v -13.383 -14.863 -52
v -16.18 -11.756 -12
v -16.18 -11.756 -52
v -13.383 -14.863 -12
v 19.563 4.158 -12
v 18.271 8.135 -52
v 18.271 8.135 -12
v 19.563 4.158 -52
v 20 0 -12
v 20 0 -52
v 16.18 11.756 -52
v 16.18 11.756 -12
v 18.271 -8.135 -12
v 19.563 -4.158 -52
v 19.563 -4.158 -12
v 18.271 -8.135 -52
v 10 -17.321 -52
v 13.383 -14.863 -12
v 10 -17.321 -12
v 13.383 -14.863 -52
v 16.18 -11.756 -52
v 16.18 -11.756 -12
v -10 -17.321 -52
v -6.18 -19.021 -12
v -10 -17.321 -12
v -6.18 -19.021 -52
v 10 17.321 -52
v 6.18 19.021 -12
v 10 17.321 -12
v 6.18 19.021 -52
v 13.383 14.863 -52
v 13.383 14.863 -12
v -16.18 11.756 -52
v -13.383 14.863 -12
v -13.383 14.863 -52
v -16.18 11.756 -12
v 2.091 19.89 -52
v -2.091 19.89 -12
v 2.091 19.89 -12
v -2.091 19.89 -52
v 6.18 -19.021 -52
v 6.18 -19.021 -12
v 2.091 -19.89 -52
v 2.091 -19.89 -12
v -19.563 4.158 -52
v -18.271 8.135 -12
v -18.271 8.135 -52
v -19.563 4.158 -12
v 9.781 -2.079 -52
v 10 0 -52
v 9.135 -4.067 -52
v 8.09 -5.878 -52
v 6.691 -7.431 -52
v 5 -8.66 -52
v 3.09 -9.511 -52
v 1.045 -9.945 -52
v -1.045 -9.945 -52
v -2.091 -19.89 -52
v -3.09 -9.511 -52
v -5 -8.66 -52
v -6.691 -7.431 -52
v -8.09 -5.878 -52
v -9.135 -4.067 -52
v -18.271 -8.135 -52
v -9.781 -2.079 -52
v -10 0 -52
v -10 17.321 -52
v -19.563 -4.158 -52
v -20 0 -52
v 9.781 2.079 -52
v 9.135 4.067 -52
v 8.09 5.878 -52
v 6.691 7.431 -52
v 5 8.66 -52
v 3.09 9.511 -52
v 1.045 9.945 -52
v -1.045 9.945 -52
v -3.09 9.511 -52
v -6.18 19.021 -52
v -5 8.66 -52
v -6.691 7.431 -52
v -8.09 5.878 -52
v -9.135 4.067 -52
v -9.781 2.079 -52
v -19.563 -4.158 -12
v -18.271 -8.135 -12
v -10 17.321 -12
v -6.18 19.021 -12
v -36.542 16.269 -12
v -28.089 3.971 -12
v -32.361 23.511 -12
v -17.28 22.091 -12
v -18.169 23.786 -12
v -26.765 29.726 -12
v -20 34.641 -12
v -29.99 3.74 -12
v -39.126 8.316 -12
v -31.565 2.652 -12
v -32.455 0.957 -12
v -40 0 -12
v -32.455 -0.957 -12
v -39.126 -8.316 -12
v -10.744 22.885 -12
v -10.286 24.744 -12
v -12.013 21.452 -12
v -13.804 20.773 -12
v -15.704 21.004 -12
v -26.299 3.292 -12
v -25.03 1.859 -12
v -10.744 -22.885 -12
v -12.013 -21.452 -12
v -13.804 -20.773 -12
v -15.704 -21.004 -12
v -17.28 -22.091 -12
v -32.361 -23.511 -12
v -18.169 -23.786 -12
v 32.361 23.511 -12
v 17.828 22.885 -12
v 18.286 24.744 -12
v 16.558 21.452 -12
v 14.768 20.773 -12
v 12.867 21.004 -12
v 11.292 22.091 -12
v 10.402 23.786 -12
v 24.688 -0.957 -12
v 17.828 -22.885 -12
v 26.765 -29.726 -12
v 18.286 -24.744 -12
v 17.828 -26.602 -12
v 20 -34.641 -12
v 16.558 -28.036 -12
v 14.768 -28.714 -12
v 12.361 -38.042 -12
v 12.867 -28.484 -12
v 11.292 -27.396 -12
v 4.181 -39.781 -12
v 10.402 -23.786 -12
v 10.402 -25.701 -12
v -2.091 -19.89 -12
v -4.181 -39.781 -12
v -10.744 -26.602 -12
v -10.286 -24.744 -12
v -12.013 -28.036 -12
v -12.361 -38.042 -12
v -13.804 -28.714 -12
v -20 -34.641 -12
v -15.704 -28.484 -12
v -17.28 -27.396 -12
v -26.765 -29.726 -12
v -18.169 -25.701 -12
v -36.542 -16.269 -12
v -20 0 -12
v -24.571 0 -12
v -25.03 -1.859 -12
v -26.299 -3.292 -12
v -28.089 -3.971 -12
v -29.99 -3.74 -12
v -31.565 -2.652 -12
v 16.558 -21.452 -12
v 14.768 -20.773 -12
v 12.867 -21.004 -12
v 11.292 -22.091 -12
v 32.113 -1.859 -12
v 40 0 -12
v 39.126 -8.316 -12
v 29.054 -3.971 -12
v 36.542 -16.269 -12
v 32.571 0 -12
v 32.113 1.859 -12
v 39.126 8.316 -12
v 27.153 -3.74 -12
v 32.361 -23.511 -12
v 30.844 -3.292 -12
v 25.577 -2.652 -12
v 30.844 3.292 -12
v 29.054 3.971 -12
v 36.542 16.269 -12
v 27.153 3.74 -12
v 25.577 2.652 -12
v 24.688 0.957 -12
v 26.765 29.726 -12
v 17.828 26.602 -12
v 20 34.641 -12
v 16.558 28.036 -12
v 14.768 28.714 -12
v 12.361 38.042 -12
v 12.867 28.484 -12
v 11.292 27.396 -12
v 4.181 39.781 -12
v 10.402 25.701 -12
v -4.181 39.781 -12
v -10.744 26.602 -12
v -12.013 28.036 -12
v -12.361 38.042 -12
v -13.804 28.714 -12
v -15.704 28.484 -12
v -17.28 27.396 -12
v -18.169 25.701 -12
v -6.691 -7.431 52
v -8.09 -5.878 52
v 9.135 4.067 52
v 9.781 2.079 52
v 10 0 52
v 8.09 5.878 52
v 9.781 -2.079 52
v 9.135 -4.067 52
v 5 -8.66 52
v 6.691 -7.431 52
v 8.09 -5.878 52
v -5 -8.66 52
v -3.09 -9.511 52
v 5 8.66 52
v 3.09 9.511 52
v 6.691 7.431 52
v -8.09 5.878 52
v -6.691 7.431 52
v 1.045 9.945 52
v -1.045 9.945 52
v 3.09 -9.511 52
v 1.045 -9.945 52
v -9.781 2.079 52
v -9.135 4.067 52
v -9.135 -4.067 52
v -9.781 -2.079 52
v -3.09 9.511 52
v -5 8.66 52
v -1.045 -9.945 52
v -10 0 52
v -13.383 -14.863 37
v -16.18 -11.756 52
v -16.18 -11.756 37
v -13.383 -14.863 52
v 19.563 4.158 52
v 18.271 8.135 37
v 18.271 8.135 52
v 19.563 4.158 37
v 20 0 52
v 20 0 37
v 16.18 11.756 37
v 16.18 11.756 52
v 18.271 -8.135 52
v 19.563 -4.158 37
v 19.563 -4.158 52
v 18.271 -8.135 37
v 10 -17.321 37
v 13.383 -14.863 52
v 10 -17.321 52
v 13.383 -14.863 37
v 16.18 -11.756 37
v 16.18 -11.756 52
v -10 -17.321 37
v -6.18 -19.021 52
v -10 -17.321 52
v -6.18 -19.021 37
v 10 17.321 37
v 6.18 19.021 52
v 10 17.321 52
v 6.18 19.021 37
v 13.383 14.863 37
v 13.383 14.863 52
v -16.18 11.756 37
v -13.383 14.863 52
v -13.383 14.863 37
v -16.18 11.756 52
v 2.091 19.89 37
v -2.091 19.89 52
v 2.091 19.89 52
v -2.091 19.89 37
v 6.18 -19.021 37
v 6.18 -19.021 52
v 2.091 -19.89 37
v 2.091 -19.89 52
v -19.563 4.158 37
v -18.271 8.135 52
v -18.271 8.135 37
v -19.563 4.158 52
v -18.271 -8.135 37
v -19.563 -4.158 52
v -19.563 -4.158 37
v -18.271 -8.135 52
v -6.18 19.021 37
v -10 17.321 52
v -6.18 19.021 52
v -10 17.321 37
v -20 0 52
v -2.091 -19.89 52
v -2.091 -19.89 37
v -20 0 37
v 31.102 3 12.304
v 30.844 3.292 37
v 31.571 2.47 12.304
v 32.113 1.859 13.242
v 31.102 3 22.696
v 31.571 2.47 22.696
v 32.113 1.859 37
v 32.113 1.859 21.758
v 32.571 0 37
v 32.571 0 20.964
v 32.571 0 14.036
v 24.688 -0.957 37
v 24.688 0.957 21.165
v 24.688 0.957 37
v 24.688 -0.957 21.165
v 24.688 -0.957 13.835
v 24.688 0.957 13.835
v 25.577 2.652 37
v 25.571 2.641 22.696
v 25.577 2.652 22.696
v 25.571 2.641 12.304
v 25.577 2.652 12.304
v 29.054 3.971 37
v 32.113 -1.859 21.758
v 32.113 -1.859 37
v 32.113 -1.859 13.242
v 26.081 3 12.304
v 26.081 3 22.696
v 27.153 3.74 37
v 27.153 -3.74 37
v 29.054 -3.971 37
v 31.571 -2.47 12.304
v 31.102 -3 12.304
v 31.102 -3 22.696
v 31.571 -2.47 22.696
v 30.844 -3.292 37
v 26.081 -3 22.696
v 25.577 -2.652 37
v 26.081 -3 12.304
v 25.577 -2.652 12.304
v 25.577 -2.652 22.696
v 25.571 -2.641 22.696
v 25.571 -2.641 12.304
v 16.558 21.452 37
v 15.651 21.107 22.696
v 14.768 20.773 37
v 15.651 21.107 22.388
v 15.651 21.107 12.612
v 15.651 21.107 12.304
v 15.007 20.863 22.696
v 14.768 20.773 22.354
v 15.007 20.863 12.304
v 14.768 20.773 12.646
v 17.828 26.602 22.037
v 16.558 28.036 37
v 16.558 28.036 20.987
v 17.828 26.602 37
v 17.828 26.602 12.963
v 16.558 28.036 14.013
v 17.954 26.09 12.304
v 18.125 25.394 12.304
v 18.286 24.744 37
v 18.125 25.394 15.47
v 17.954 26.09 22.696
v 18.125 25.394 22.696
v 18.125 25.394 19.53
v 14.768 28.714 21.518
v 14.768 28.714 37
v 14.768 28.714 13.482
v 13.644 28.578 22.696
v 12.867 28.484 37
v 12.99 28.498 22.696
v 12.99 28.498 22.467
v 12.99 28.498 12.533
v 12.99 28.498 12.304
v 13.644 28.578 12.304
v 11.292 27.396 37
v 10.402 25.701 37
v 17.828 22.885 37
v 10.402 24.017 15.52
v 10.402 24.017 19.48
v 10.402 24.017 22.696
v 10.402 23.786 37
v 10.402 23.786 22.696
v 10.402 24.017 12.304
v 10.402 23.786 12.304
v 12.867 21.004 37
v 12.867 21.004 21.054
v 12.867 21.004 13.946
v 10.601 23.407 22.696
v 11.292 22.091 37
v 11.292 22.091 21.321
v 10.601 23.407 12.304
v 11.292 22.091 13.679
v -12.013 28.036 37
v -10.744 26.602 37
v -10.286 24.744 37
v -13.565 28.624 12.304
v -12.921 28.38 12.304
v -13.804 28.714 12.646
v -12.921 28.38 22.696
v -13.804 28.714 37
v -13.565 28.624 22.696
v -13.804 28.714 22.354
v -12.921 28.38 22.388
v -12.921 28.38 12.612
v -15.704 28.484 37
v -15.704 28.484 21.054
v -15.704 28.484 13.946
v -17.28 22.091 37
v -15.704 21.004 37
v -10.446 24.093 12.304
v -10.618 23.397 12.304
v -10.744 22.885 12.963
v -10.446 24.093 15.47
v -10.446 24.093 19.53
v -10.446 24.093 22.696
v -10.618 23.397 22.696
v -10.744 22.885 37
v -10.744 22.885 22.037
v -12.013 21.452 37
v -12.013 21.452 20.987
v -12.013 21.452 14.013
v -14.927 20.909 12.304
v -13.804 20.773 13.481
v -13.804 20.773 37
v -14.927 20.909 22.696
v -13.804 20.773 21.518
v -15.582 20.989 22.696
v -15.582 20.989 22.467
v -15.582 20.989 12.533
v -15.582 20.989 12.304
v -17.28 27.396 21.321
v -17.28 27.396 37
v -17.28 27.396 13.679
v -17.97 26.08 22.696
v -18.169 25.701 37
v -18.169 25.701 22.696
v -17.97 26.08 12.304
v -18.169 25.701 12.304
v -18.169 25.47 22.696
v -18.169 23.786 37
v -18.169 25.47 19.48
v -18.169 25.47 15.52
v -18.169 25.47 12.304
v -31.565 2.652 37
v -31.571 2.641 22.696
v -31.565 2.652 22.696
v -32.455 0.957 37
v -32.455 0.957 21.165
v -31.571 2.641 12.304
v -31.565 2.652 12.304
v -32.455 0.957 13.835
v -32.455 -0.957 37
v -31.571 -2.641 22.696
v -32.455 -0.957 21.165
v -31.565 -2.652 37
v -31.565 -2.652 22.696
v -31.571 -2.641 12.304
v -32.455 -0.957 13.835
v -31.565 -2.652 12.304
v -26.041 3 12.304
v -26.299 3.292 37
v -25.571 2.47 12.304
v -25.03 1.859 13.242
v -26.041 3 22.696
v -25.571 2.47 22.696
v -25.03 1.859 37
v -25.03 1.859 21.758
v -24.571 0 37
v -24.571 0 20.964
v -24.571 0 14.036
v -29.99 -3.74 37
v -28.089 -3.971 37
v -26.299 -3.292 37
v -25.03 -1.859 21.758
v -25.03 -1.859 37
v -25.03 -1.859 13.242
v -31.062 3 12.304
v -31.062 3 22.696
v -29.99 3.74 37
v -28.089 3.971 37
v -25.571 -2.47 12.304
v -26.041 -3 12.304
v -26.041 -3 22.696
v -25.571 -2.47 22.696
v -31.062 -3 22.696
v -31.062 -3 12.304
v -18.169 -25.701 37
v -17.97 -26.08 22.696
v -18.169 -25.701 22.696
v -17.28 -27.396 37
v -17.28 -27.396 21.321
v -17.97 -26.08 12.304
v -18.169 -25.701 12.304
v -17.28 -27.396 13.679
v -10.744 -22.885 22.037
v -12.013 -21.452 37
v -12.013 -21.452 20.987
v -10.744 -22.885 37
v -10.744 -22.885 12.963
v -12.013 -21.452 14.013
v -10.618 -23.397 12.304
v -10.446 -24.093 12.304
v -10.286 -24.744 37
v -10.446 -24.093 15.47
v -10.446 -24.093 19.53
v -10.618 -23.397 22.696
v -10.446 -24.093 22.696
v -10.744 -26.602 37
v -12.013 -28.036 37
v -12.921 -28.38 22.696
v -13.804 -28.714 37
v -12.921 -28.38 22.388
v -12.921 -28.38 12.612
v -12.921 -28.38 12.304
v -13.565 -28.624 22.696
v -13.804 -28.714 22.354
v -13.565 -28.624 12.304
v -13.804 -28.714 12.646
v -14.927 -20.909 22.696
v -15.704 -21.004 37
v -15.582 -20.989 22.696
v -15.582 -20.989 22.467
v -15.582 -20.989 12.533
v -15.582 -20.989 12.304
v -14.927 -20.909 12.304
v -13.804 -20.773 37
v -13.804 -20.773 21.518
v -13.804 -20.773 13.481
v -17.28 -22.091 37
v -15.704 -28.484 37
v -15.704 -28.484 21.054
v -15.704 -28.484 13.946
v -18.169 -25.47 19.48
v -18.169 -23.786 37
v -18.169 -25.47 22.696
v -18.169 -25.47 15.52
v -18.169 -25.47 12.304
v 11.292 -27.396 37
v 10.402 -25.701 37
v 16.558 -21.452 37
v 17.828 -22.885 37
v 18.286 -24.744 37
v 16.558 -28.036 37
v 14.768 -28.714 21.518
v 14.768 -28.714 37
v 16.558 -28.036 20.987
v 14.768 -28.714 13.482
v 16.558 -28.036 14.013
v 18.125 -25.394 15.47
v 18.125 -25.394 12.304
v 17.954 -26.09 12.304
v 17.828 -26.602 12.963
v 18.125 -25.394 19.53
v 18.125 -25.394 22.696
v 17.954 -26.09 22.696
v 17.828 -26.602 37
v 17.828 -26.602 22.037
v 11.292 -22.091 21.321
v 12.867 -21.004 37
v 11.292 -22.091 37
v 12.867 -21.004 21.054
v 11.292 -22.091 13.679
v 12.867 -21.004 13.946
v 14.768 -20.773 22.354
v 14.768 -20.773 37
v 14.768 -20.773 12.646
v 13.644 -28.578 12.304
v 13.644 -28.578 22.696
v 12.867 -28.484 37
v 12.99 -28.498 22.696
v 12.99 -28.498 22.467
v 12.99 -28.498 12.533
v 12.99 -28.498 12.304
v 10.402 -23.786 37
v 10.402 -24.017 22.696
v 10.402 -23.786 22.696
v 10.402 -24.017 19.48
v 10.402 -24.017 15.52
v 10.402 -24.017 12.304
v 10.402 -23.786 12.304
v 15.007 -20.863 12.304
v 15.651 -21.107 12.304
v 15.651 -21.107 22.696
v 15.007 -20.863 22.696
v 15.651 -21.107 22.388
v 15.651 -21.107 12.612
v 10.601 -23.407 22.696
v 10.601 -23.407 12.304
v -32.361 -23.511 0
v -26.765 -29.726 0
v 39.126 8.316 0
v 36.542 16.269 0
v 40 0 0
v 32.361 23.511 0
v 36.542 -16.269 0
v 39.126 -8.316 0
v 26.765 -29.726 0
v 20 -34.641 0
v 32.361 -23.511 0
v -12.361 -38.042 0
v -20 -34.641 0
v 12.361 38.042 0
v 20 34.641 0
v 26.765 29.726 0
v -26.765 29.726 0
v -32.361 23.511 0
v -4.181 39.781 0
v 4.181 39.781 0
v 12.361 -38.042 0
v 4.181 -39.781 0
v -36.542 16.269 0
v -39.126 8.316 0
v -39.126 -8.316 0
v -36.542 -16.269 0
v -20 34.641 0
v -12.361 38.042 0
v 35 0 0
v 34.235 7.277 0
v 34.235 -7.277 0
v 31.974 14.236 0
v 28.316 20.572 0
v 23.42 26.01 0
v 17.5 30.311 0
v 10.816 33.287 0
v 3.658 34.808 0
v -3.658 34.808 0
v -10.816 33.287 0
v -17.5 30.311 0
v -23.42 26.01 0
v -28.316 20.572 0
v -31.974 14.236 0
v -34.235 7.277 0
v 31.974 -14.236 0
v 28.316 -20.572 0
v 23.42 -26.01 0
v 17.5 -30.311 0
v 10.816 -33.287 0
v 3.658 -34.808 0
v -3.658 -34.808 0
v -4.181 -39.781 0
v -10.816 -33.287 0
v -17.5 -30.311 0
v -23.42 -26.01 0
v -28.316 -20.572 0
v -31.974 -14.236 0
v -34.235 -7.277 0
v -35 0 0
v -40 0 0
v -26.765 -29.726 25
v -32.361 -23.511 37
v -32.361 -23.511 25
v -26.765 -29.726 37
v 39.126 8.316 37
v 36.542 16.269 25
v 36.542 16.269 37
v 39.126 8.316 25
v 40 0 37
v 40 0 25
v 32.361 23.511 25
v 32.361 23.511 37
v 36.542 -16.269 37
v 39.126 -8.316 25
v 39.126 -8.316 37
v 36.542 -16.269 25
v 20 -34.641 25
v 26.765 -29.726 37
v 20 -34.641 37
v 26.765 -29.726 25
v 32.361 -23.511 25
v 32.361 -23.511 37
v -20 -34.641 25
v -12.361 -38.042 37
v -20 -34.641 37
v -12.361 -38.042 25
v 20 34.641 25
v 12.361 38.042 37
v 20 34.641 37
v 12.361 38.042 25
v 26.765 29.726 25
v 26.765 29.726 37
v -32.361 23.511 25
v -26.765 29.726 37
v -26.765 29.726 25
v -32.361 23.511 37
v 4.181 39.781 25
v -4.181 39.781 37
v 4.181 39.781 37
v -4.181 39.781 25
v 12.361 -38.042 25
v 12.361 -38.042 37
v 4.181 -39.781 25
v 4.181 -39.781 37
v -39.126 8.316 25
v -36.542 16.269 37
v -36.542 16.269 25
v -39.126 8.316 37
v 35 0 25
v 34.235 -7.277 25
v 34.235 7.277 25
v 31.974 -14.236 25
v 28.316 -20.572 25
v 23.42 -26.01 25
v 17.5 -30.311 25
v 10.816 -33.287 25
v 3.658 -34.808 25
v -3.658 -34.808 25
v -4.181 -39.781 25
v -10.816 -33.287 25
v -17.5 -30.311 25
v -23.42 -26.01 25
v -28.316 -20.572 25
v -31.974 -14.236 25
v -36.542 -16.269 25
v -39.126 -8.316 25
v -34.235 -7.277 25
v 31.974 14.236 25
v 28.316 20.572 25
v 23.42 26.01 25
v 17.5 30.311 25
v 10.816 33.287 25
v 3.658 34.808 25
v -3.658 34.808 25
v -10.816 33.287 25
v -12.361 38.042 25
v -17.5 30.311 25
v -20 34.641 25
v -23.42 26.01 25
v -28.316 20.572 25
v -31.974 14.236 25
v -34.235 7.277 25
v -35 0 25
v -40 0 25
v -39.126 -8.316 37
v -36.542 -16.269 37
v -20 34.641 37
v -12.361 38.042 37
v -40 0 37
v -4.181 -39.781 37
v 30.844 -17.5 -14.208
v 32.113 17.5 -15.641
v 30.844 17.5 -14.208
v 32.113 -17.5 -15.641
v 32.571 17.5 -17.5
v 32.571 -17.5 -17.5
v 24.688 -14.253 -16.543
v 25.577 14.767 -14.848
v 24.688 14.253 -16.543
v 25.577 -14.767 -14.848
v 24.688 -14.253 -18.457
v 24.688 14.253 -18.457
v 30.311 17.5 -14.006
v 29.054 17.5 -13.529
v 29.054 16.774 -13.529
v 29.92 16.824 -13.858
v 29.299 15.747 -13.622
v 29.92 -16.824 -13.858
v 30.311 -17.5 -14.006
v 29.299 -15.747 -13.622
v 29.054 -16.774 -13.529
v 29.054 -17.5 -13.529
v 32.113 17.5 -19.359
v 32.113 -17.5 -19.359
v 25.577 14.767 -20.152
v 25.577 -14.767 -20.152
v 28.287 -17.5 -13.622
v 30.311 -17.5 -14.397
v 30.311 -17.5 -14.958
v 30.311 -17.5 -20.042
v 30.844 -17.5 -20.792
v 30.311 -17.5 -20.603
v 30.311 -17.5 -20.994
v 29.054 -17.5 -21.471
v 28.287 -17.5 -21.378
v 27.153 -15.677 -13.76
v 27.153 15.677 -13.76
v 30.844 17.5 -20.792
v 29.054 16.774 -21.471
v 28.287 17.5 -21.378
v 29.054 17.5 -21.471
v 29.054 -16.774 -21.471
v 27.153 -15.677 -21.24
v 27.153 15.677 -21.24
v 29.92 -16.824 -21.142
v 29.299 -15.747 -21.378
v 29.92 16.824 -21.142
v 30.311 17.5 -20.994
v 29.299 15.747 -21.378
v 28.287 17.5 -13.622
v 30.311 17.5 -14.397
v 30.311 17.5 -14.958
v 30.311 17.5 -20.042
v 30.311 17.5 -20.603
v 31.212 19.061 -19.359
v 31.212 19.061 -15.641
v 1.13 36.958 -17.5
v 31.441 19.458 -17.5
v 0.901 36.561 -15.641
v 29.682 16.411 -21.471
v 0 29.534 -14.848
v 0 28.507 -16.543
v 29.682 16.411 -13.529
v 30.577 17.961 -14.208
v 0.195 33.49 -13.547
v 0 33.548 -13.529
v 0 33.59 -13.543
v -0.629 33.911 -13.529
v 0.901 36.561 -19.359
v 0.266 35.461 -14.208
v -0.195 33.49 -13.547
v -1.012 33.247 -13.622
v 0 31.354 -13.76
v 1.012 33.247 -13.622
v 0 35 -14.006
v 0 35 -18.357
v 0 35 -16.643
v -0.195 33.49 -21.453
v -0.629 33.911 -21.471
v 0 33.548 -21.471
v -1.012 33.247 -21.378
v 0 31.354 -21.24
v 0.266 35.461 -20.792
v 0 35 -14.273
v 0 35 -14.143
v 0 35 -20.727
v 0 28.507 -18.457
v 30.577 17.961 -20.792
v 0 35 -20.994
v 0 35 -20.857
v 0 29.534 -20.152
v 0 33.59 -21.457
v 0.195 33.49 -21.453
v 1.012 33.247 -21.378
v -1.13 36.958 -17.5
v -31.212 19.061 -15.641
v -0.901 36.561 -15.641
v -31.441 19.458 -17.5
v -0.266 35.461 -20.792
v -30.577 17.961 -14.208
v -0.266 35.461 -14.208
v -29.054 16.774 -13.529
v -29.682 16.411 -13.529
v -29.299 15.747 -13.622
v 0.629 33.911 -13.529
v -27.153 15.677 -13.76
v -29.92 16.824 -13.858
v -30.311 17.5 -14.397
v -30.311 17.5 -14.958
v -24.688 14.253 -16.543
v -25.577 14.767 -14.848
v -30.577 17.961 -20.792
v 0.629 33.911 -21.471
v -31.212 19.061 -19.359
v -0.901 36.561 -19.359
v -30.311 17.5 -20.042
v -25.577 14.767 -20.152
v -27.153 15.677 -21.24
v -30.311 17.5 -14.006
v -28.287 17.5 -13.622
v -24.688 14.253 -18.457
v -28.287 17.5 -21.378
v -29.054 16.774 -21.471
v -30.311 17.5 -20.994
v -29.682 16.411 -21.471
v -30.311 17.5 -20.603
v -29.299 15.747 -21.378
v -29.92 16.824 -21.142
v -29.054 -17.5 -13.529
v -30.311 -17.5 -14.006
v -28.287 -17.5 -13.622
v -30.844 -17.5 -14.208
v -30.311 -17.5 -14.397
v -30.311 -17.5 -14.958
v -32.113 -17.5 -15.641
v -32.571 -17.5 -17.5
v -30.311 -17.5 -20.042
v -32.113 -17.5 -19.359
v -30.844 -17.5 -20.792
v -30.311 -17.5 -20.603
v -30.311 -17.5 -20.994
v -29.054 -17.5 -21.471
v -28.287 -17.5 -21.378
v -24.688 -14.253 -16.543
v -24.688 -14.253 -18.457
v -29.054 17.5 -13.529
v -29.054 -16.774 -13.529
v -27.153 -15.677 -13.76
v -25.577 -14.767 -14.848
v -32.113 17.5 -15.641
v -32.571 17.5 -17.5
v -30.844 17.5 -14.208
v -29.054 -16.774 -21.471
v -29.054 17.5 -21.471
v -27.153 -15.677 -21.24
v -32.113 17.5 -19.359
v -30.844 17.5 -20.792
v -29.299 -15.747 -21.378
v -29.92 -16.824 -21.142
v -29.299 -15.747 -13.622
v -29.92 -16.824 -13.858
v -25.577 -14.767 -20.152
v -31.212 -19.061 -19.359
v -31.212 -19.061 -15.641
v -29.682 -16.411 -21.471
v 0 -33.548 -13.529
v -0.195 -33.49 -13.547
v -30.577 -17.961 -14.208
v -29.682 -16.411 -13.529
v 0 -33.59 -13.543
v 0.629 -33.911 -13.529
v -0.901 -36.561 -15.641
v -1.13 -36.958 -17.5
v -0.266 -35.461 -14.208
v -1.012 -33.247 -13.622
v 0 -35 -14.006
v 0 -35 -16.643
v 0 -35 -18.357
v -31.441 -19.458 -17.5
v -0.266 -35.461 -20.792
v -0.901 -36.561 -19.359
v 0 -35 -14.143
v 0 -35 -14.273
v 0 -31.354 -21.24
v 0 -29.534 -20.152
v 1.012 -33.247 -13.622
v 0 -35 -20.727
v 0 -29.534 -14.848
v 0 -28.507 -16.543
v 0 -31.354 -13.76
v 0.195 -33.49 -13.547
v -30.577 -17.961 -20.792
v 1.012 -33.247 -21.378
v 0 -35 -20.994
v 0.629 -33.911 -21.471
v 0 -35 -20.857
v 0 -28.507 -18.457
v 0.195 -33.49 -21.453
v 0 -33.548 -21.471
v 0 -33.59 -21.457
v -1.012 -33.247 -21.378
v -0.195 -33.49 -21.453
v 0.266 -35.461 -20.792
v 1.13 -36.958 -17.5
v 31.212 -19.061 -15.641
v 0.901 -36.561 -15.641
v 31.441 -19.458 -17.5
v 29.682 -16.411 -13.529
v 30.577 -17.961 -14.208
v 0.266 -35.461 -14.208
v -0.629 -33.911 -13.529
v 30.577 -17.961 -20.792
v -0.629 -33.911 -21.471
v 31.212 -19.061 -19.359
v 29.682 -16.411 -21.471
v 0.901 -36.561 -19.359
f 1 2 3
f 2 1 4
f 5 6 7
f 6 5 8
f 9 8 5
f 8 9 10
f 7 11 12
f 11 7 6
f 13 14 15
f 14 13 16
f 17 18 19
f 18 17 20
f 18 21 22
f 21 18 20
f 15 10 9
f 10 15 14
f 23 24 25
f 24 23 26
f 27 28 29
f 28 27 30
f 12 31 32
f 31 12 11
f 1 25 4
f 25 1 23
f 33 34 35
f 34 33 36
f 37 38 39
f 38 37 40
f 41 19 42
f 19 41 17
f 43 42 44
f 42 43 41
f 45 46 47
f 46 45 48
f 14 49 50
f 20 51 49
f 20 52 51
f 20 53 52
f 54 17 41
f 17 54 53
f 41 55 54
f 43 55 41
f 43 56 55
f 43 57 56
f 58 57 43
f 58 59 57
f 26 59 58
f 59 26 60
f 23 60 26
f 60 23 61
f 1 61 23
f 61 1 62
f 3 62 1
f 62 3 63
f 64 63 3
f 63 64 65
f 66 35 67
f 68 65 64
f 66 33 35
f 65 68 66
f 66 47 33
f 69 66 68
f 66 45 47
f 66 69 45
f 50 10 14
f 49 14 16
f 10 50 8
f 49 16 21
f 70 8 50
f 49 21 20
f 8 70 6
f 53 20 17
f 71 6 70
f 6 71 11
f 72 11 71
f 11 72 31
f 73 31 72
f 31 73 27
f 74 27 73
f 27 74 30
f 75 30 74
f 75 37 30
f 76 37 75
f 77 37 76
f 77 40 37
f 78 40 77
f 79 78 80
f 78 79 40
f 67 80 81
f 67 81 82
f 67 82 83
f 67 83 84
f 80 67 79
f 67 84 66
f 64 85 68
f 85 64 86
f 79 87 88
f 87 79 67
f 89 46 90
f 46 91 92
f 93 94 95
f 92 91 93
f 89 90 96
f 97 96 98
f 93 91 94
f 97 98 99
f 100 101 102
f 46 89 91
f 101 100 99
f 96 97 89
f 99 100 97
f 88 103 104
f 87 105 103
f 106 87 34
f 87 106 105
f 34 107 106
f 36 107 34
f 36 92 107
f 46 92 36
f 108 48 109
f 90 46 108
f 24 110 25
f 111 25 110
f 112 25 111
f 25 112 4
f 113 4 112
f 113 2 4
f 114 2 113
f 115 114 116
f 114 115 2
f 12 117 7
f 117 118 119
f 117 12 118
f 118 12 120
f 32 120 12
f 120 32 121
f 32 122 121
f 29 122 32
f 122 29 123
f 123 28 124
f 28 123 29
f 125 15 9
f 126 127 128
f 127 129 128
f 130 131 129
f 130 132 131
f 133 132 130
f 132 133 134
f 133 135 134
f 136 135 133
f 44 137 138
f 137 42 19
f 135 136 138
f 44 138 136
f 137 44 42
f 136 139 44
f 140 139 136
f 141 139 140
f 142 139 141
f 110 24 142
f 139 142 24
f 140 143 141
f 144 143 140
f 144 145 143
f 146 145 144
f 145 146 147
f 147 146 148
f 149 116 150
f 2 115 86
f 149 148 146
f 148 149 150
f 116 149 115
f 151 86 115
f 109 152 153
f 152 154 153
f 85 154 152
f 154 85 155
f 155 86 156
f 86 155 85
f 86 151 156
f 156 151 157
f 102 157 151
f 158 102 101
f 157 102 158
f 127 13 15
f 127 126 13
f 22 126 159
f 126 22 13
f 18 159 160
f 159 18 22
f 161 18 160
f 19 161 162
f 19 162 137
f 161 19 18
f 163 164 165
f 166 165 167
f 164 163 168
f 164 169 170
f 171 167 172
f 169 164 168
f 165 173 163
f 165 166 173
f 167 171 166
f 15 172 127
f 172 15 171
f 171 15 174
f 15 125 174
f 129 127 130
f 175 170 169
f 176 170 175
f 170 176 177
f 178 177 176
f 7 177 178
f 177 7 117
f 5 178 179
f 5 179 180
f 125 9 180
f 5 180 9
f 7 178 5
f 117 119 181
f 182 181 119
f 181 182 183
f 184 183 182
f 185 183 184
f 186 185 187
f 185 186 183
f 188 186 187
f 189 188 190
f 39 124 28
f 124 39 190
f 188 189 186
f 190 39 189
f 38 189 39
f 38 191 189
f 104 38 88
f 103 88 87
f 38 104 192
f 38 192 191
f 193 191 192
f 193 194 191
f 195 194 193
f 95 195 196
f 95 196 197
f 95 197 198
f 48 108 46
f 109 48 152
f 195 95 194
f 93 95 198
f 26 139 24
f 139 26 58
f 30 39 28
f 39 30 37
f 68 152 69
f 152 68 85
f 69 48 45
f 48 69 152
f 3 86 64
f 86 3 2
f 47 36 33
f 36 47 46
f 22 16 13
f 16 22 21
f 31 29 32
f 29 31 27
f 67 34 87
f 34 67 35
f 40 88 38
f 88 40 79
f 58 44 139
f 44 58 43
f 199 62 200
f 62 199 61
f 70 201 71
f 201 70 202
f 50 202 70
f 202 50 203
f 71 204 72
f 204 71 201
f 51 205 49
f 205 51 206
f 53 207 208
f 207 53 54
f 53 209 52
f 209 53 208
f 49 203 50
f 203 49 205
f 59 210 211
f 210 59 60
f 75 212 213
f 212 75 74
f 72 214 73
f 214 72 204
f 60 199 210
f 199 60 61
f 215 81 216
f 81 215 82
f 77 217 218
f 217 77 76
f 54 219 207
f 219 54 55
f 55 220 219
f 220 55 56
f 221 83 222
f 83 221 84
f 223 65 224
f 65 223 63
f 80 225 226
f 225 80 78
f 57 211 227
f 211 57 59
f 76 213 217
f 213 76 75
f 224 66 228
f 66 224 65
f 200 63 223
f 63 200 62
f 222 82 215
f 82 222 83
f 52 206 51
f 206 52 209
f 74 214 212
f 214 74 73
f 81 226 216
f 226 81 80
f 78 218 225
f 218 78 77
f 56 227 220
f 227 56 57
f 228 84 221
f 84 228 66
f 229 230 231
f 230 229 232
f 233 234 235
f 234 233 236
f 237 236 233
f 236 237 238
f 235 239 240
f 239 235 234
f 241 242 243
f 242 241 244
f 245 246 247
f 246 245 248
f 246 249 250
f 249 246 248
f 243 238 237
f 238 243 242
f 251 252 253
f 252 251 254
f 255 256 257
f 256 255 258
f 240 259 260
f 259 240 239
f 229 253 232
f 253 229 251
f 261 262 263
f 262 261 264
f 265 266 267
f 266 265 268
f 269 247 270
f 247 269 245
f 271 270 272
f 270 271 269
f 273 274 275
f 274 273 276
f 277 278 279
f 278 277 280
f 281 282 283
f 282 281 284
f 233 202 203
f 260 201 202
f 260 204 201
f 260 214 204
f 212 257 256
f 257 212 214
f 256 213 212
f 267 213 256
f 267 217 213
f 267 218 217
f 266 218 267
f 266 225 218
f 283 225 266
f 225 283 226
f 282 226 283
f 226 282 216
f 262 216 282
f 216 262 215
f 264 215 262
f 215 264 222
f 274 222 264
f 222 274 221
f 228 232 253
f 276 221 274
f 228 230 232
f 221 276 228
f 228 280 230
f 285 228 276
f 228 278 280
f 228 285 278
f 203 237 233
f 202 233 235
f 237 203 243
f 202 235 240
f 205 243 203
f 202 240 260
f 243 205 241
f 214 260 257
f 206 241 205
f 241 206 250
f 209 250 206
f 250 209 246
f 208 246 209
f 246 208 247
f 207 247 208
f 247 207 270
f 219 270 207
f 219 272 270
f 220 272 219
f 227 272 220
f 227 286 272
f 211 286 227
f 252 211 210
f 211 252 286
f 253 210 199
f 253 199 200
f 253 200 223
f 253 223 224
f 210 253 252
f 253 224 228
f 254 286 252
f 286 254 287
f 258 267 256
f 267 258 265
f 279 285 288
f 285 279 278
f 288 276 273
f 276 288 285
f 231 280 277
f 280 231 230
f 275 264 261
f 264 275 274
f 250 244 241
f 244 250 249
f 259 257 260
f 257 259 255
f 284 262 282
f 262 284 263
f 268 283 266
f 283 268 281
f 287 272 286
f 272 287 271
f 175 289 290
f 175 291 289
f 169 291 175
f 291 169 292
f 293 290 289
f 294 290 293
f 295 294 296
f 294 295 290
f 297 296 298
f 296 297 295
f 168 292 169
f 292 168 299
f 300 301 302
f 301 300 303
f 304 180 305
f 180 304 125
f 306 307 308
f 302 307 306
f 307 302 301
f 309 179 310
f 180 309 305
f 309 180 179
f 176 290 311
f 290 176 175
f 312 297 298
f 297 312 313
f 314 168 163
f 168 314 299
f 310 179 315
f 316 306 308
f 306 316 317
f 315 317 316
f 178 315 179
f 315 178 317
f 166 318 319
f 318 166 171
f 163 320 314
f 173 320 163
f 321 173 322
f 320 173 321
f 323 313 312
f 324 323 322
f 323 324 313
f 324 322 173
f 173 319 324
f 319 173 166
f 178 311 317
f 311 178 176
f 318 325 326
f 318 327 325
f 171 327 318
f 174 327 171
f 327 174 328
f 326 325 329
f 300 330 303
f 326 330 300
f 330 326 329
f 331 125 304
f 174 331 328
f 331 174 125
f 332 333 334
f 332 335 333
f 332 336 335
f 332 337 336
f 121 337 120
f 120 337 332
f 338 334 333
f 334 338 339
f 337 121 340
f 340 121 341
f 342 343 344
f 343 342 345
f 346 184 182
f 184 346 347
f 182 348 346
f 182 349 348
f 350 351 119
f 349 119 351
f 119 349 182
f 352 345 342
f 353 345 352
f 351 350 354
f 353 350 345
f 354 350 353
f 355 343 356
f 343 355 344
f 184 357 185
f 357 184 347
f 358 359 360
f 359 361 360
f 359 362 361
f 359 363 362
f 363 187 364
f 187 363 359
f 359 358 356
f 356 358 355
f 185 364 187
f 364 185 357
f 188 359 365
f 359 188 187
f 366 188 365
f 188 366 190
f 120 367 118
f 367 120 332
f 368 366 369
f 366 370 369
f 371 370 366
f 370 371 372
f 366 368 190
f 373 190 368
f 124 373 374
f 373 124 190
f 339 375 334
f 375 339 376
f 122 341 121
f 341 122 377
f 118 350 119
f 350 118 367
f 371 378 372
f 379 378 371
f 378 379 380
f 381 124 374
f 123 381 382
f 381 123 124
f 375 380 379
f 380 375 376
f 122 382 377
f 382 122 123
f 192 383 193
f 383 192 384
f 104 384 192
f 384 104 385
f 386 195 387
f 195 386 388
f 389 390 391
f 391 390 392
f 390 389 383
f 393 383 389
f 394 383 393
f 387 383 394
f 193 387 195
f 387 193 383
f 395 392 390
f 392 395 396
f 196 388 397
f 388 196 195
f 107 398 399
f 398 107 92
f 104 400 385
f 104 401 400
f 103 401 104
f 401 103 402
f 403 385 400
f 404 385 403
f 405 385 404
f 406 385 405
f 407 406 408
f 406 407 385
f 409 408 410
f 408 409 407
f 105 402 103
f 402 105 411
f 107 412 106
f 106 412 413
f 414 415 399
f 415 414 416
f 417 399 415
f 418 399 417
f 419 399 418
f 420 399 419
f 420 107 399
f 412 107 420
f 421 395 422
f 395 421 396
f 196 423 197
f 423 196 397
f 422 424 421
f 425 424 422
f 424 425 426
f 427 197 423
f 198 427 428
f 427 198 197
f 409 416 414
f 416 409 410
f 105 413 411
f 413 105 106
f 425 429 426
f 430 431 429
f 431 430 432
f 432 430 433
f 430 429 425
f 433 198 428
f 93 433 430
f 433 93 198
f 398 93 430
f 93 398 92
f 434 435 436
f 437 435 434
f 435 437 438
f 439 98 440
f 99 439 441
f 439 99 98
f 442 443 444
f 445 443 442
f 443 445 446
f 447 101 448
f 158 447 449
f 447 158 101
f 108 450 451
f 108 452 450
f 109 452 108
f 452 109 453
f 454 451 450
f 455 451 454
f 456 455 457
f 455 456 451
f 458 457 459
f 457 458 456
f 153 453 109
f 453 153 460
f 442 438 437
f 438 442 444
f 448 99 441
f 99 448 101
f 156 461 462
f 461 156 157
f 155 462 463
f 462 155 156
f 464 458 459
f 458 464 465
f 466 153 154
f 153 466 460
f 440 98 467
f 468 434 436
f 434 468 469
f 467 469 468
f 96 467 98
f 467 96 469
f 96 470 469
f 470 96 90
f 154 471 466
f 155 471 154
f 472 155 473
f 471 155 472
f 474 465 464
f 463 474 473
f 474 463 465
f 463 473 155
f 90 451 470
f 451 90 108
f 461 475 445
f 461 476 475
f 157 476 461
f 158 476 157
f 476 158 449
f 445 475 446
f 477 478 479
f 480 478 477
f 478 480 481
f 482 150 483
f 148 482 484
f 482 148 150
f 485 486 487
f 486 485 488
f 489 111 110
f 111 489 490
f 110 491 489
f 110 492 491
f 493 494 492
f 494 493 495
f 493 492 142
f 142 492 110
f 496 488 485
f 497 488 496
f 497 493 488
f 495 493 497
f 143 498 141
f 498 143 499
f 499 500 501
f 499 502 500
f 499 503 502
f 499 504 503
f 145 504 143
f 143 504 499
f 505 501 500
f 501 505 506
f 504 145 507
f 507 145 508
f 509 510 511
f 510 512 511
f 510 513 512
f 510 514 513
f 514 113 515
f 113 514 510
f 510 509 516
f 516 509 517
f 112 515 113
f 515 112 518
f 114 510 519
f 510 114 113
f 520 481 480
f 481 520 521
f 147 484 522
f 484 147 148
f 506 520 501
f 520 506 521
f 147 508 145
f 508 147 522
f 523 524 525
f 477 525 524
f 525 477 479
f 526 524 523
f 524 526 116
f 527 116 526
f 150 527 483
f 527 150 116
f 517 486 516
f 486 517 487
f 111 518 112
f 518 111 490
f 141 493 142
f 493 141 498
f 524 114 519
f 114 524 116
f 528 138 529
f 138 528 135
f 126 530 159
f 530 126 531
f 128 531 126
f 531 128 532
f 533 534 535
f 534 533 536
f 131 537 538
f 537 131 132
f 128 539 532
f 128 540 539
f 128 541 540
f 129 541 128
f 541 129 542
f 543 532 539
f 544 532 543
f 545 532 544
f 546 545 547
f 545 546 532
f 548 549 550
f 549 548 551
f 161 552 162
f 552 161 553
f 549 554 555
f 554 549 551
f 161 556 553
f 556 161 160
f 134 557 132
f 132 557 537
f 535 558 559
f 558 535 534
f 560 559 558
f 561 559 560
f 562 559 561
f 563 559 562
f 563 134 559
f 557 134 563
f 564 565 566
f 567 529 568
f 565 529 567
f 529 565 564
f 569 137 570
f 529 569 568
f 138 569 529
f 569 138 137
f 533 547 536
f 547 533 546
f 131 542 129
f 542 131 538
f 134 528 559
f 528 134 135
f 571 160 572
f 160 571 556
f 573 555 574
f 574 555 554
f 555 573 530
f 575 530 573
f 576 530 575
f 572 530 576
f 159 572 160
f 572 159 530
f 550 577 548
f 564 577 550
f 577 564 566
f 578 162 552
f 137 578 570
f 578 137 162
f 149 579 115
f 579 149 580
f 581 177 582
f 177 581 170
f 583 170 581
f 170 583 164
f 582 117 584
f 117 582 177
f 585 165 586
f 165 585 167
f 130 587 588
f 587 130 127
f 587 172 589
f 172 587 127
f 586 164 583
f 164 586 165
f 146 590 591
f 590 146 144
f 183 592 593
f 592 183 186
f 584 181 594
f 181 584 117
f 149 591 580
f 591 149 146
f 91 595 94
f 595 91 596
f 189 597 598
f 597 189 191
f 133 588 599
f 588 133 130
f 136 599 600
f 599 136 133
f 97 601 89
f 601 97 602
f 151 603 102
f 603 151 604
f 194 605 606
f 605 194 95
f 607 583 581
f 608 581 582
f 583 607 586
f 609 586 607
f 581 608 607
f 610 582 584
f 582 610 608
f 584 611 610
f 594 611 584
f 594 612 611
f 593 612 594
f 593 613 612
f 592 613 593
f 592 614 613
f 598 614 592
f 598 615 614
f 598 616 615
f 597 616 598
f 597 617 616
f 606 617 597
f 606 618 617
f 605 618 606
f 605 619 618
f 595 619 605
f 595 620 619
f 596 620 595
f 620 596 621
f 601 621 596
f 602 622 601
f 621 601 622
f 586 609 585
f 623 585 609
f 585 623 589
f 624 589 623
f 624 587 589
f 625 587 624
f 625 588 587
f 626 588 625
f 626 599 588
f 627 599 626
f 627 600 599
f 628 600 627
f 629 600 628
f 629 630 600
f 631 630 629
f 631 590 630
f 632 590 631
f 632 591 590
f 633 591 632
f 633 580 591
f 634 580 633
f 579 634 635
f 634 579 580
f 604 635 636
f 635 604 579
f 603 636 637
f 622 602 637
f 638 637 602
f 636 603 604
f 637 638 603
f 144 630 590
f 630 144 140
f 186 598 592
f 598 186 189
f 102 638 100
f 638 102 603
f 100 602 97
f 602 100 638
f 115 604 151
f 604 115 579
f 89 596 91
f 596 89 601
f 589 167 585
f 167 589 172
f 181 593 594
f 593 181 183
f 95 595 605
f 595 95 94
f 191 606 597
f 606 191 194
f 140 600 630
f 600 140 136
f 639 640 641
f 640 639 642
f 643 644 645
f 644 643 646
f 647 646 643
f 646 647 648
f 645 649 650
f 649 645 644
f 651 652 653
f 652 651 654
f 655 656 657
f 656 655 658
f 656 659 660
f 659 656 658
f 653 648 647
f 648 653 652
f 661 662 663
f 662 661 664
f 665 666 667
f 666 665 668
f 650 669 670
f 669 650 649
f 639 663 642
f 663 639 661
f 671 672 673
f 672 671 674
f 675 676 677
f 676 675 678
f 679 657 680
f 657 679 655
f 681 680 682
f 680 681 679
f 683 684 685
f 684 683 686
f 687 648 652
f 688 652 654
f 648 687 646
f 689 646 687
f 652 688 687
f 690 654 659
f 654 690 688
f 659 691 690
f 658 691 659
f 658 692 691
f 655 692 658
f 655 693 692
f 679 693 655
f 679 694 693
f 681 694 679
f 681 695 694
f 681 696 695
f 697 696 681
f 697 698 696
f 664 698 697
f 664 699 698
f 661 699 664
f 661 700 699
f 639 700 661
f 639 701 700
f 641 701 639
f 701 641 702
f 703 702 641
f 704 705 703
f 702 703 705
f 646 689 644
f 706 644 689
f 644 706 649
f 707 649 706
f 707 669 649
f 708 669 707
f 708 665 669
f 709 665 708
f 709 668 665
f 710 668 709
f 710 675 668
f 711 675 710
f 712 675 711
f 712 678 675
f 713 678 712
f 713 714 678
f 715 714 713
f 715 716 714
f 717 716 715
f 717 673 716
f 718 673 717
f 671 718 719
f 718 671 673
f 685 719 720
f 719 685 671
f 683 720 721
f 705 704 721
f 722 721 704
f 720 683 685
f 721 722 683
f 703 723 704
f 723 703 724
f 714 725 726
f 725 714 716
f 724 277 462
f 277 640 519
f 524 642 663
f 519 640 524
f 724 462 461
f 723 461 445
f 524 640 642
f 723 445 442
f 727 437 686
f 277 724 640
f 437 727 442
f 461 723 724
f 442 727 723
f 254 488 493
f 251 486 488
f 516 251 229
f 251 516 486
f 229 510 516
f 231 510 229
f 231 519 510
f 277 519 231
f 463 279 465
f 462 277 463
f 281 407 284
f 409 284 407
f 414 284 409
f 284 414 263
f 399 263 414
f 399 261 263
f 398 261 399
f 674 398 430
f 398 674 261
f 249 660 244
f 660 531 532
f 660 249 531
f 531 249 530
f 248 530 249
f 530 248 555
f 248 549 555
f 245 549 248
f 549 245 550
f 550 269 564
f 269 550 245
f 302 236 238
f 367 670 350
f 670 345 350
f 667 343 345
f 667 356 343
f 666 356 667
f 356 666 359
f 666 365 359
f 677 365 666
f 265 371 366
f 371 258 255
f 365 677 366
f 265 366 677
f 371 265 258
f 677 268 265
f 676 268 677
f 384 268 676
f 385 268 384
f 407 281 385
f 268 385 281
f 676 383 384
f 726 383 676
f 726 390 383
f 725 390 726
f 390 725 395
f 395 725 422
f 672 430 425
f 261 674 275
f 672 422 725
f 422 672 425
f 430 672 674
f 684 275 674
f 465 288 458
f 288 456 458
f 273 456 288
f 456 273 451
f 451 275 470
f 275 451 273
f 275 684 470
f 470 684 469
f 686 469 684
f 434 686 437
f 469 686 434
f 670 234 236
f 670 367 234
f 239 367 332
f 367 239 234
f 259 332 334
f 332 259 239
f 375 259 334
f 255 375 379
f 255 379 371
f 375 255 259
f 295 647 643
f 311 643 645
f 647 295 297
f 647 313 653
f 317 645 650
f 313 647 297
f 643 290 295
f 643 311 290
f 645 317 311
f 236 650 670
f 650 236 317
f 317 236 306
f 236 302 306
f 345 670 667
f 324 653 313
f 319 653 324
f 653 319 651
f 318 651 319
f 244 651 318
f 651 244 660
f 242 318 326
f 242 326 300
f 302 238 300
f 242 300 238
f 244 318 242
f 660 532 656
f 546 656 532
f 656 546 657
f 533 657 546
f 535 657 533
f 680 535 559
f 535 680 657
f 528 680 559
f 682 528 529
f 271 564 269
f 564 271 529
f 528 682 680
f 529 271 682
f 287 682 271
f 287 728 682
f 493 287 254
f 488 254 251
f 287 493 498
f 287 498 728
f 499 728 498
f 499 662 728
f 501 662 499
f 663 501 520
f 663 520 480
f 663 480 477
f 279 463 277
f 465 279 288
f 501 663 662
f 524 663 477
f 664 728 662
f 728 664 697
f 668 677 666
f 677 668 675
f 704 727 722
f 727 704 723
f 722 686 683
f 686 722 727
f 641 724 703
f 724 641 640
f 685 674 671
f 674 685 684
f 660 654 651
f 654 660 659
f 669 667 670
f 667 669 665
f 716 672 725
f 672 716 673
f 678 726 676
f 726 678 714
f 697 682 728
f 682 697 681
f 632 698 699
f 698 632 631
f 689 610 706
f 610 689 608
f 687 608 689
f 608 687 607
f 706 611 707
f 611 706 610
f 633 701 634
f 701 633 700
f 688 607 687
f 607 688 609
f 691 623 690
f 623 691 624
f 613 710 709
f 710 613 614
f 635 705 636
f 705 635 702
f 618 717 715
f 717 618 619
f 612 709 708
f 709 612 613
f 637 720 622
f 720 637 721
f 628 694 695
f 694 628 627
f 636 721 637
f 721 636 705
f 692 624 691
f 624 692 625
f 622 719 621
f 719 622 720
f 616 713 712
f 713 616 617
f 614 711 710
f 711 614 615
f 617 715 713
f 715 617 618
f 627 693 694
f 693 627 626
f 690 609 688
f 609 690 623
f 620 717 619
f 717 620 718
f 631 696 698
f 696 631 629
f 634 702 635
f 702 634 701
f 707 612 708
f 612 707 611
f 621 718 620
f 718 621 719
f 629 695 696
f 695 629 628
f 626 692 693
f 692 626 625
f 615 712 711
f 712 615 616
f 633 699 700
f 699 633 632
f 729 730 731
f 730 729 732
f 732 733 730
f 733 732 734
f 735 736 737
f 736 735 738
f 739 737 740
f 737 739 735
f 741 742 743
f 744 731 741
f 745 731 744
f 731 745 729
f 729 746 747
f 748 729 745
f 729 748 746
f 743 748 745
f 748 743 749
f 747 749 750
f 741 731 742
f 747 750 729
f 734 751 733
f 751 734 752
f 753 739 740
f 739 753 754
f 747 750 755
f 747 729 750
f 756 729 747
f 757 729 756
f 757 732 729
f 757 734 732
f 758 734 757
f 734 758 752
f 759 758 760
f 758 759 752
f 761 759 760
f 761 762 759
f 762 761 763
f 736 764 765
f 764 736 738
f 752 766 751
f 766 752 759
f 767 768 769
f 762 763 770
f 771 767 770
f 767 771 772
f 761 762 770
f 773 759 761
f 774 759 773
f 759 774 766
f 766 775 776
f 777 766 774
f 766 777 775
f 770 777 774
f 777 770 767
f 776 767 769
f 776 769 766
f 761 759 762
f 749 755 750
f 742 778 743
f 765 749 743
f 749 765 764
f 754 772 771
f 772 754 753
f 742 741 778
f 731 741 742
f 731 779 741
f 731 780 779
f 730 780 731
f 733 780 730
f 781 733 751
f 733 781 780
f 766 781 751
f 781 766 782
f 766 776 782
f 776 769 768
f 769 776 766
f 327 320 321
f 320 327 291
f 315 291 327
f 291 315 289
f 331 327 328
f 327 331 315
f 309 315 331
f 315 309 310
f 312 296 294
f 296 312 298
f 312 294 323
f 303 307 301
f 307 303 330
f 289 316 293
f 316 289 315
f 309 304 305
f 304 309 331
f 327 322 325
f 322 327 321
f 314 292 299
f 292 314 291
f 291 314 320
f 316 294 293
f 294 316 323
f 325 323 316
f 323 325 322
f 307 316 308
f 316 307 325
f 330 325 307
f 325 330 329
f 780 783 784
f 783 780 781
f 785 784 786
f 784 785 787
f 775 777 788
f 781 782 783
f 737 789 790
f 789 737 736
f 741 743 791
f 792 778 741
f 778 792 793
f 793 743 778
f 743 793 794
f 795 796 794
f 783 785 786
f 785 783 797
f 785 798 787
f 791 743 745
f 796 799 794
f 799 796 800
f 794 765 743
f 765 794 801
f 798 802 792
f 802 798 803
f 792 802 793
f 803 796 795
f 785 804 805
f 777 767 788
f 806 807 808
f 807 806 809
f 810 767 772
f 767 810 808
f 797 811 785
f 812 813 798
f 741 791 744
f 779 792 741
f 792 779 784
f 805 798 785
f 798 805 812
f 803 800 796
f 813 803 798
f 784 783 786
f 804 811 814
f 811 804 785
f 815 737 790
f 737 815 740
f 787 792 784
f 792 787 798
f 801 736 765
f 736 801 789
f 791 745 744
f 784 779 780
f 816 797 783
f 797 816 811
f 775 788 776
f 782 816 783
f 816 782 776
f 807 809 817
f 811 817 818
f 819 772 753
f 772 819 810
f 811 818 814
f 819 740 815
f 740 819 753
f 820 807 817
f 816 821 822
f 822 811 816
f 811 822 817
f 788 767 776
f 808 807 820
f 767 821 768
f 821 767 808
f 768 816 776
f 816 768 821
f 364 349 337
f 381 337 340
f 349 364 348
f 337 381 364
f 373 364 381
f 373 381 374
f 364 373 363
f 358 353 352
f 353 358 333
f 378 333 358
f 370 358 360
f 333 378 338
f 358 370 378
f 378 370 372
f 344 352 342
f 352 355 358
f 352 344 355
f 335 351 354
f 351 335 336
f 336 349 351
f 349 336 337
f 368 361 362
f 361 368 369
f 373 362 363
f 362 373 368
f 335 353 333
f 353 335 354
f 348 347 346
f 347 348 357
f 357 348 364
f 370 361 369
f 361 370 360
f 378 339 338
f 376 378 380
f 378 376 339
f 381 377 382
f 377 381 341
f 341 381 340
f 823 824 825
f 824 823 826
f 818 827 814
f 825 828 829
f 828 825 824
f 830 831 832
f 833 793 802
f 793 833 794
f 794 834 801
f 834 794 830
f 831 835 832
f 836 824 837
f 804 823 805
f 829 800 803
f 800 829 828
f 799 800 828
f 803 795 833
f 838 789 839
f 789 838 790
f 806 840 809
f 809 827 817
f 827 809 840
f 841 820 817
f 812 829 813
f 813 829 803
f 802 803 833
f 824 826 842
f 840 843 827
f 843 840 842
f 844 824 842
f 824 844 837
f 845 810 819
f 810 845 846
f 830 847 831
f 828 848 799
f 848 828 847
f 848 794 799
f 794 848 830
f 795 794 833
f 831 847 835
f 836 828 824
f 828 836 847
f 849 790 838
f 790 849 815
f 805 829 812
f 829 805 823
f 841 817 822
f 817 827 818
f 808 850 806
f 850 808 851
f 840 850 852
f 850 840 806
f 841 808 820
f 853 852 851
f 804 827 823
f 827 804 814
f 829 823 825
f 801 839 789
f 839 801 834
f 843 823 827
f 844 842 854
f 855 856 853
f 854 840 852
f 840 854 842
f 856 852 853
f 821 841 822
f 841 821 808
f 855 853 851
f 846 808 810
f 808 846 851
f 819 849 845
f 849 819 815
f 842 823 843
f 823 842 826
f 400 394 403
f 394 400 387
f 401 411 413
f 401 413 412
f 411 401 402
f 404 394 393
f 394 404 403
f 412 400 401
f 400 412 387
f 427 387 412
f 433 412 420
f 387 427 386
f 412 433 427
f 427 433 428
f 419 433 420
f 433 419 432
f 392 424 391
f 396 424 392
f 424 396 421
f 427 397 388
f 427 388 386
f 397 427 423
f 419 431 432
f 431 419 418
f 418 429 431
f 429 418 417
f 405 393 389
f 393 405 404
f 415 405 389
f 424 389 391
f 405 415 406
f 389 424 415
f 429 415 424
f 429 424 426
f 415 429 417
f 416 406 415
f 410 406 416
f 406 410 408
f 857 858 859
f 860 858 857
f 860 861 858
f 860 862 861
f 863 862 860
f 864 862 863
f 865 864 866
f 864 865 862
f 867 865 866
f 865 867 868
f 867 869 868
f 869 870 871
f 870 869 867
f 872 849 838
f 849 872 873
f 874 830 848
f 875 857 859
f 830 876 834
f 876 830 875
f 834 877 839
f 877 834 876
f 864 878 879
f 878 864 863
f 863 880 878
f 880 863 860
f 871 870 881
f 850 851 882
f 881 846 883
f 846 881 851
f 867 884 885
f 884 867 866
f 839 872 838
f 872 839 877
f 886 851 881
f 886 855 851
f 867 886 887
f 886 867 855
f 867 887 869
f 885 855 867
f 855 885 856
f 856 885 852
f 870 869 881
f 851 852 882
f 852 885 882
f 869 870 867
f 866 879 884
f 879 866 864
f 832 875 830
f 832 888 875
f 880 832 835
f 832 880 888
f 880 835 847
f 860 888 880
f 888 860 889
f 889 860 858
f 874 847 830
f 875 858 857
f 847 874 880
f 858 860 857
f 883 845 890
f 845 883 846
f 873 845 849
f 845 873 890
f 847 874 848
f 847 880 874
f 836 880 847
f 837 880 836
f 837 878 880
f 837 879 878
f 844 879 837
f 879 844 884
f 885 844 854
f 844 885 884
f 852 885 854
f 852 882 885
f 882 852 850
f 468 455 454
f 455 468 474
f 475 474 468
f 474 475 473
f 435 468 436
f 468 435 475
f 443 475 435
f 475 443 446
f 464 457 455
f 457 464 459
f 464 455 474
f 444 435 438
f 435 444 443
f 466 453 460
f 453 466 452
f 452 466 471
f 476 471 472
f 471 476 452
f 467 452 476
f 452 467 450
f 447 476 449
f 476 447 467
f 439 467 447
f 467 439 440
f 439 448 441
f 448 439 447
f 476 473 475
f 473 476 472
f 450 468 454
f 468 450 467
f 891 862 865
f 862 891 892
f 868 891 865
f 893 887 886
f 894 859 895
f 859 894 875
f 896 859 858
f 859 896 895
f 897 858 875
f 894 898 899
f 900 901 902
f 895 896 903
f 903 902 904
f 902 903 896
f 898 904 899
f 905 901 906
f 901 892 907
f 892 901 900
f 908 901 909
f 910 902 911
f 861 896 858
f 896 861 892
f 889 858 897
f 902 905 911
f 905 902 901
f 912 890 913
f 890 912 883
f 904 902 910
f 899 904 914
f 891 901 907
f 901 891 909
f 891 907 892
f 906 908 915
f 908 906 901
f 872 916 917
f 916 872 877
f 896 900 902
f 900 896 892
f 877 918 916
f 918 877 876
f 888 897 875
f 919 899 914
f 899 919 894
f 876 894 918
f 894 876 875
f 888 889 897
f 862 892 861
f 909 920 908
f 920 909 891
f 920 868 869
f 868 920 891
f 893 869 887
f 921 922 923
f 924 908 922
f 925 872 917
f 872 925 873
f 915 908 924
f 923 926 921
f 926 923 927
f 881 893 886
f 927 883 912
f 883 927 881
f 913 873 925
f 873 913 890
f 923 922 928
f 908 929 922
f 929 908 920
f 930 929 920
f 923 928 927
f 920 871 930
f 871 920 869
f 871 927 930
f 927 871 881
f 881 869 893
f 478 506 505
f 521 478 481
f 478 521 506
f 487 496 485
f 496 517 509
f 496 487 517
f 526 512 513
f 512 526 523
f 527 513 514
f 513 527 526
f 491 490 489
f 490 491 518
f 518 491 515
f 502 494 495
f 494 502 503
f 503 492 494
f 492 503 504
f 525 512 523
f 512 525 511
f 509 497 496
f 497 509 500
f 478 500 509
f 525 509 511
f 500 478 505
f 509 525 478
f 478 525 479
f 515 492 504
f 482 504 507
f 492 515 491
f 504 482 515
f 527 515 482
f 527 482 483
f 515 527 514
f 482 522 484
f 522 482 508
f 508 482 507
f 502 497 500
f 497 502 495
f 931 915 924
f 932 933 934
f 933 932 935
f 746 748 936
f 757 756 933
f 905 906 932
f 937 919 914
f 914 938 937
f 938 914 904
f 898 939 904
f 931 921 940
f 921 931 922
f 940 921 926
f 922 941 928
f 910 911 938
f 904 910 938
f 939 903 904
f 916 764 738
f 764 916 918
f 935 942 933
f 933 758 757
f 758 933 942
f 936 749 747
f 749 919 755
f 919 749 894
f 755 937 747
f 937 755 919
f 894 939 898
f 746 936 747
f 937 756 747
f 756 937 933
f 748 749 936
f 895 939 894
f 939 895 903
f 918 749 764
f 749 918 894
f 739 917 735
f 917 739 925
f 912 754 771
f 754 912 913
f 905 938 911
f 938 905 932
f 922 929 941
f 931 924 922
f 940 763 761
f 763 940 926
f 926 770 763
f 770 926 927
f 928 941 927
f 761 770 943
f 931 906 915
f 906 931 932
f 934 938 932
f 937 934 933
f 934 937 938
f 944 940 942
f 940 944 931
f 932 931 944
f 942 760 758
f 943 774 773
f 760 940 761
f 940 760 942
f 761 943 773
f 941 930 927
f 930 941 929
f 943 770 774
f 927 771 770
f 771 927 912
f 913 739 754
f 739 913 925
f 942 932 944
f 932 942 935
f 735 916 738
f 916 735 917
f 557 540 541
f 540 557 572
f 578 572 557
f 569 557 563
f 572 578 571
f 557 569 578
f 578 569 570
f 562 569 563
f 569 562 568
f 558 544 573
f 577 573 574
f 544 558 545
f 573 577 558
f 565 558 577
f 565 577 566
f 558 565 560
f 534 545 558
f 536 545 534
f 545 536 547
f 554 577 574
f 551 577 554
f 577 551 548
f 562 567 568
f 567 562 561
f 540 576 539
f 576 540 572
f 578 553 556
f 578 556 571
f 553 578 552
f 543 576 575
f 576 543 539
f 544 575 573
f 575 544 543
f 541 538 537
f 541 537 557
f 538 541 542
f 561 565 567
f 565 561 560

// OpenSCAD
// Parameters
shaft_hub_diameter = 40;
shaft_hub_length = 40; // Shortened to match the original model
shaft_hole_diameter = 20;
flange_diameter = 80;
flange_thickness = 12; // Adjusted flange thickness
bolt_hole_diameter = 8;
bolt_count = 6;
bolt_length = 35; // Extended bolts to correctly protrude
bolt_diameter = 8;
nut_diameter = 12;
nut_thickness = 6;
spacer_diameter = 70;
spacer_thickness = 25; // Adjusted spacer thickness

// Function to create a shaft hub
module shaft_hub() {
    difference() {
        cylinder(d=shaft_hub_diameter, h=shaft_hub_length, center=true);
        cylinder(d=shaft_hole_diameter, h=shaft_hub_length + 2, center=true);
    }
}

// Function to create a flange plate
module flange_plate() {
    difference() {
        cylinder(d=flange_diameter, h=flange_thickness, center=true);
        cylinder(d=shaft_hole_diameter, h=flange_thickness + 2, center=true);
        for (i = [0:bolt_count-1]) {
            angle = i * 360 / bolt_count;
            translate([flange_diameter/2.8 * cos(angle), flange_diameter/2.8 * sin(angle), 0]) // Adjusted hole positioning
                cylinder(d=bolt_hole_diameter, h=flange_thickness + 2, center=true);
        }
    }
}

// Function to create the spacer element
module spacer_element() {
    difference() {
        cylinder(d=spacer_diameter, h=spacer_thickness, center=true);
        cylinder(d=shaft_hole_diameter, h=spacer_thickness + 2, center=true);
        for (i = [0:bolt_count-1]) {
            angle = i * 360 / bolt_count;
            translate([flange_diameter/2.8 * cos(angle), flange_diameter/2.8 * sin(angle), 0]) // Adjusted hole positioning
                cylinder(d=bolt_hole_diameter, h=spacer_thickness + 2, center=true);
        }
    }
}

// Function to create a bolt
module bolt() {
    cylinder(d=bolt_diameter, h=bolt_length, center=true);
}

// Function to create a nut
module nut() {
    cylinder(d=nut_diameter, h=nut_thickness, center=true, $fn=6);
}

// Assembly
module coupling() {
    translate([0, 0, -shaft_hub_length/2 - flange_thickness])
        shaft_hub();
    
    translate([0, 0, shaft_hub_length/2 + flange_thickness])
        shaft_hub();
    
    translate([0, 0, -flange_thickness/2])
        flange_plate();
    
    translate([0, 0, flange_thickness/2 + spacer_thickness])
        flange_plate();
    
    translate([0, 0, spacer_thickness/2])
        spacer_element();
    
    for (i = [0:bolt_count-1]) {
        angle = i * 360 / bolt_count;
        translate([flange_diameter/2.8 * cos(angle), flange_diameter/2.8 * sin(angle), -bolt_length/2])
            rotate([90, 0, angle])
                bolt();
        
        translate([flange_diameter/2.8 * cos(angle), flange_diameter/2.8 * sin(angle), bolt_length/2])
            rotate([90, 0, angle])
                nut();
    }
}

// Render the coupling
coupling();
